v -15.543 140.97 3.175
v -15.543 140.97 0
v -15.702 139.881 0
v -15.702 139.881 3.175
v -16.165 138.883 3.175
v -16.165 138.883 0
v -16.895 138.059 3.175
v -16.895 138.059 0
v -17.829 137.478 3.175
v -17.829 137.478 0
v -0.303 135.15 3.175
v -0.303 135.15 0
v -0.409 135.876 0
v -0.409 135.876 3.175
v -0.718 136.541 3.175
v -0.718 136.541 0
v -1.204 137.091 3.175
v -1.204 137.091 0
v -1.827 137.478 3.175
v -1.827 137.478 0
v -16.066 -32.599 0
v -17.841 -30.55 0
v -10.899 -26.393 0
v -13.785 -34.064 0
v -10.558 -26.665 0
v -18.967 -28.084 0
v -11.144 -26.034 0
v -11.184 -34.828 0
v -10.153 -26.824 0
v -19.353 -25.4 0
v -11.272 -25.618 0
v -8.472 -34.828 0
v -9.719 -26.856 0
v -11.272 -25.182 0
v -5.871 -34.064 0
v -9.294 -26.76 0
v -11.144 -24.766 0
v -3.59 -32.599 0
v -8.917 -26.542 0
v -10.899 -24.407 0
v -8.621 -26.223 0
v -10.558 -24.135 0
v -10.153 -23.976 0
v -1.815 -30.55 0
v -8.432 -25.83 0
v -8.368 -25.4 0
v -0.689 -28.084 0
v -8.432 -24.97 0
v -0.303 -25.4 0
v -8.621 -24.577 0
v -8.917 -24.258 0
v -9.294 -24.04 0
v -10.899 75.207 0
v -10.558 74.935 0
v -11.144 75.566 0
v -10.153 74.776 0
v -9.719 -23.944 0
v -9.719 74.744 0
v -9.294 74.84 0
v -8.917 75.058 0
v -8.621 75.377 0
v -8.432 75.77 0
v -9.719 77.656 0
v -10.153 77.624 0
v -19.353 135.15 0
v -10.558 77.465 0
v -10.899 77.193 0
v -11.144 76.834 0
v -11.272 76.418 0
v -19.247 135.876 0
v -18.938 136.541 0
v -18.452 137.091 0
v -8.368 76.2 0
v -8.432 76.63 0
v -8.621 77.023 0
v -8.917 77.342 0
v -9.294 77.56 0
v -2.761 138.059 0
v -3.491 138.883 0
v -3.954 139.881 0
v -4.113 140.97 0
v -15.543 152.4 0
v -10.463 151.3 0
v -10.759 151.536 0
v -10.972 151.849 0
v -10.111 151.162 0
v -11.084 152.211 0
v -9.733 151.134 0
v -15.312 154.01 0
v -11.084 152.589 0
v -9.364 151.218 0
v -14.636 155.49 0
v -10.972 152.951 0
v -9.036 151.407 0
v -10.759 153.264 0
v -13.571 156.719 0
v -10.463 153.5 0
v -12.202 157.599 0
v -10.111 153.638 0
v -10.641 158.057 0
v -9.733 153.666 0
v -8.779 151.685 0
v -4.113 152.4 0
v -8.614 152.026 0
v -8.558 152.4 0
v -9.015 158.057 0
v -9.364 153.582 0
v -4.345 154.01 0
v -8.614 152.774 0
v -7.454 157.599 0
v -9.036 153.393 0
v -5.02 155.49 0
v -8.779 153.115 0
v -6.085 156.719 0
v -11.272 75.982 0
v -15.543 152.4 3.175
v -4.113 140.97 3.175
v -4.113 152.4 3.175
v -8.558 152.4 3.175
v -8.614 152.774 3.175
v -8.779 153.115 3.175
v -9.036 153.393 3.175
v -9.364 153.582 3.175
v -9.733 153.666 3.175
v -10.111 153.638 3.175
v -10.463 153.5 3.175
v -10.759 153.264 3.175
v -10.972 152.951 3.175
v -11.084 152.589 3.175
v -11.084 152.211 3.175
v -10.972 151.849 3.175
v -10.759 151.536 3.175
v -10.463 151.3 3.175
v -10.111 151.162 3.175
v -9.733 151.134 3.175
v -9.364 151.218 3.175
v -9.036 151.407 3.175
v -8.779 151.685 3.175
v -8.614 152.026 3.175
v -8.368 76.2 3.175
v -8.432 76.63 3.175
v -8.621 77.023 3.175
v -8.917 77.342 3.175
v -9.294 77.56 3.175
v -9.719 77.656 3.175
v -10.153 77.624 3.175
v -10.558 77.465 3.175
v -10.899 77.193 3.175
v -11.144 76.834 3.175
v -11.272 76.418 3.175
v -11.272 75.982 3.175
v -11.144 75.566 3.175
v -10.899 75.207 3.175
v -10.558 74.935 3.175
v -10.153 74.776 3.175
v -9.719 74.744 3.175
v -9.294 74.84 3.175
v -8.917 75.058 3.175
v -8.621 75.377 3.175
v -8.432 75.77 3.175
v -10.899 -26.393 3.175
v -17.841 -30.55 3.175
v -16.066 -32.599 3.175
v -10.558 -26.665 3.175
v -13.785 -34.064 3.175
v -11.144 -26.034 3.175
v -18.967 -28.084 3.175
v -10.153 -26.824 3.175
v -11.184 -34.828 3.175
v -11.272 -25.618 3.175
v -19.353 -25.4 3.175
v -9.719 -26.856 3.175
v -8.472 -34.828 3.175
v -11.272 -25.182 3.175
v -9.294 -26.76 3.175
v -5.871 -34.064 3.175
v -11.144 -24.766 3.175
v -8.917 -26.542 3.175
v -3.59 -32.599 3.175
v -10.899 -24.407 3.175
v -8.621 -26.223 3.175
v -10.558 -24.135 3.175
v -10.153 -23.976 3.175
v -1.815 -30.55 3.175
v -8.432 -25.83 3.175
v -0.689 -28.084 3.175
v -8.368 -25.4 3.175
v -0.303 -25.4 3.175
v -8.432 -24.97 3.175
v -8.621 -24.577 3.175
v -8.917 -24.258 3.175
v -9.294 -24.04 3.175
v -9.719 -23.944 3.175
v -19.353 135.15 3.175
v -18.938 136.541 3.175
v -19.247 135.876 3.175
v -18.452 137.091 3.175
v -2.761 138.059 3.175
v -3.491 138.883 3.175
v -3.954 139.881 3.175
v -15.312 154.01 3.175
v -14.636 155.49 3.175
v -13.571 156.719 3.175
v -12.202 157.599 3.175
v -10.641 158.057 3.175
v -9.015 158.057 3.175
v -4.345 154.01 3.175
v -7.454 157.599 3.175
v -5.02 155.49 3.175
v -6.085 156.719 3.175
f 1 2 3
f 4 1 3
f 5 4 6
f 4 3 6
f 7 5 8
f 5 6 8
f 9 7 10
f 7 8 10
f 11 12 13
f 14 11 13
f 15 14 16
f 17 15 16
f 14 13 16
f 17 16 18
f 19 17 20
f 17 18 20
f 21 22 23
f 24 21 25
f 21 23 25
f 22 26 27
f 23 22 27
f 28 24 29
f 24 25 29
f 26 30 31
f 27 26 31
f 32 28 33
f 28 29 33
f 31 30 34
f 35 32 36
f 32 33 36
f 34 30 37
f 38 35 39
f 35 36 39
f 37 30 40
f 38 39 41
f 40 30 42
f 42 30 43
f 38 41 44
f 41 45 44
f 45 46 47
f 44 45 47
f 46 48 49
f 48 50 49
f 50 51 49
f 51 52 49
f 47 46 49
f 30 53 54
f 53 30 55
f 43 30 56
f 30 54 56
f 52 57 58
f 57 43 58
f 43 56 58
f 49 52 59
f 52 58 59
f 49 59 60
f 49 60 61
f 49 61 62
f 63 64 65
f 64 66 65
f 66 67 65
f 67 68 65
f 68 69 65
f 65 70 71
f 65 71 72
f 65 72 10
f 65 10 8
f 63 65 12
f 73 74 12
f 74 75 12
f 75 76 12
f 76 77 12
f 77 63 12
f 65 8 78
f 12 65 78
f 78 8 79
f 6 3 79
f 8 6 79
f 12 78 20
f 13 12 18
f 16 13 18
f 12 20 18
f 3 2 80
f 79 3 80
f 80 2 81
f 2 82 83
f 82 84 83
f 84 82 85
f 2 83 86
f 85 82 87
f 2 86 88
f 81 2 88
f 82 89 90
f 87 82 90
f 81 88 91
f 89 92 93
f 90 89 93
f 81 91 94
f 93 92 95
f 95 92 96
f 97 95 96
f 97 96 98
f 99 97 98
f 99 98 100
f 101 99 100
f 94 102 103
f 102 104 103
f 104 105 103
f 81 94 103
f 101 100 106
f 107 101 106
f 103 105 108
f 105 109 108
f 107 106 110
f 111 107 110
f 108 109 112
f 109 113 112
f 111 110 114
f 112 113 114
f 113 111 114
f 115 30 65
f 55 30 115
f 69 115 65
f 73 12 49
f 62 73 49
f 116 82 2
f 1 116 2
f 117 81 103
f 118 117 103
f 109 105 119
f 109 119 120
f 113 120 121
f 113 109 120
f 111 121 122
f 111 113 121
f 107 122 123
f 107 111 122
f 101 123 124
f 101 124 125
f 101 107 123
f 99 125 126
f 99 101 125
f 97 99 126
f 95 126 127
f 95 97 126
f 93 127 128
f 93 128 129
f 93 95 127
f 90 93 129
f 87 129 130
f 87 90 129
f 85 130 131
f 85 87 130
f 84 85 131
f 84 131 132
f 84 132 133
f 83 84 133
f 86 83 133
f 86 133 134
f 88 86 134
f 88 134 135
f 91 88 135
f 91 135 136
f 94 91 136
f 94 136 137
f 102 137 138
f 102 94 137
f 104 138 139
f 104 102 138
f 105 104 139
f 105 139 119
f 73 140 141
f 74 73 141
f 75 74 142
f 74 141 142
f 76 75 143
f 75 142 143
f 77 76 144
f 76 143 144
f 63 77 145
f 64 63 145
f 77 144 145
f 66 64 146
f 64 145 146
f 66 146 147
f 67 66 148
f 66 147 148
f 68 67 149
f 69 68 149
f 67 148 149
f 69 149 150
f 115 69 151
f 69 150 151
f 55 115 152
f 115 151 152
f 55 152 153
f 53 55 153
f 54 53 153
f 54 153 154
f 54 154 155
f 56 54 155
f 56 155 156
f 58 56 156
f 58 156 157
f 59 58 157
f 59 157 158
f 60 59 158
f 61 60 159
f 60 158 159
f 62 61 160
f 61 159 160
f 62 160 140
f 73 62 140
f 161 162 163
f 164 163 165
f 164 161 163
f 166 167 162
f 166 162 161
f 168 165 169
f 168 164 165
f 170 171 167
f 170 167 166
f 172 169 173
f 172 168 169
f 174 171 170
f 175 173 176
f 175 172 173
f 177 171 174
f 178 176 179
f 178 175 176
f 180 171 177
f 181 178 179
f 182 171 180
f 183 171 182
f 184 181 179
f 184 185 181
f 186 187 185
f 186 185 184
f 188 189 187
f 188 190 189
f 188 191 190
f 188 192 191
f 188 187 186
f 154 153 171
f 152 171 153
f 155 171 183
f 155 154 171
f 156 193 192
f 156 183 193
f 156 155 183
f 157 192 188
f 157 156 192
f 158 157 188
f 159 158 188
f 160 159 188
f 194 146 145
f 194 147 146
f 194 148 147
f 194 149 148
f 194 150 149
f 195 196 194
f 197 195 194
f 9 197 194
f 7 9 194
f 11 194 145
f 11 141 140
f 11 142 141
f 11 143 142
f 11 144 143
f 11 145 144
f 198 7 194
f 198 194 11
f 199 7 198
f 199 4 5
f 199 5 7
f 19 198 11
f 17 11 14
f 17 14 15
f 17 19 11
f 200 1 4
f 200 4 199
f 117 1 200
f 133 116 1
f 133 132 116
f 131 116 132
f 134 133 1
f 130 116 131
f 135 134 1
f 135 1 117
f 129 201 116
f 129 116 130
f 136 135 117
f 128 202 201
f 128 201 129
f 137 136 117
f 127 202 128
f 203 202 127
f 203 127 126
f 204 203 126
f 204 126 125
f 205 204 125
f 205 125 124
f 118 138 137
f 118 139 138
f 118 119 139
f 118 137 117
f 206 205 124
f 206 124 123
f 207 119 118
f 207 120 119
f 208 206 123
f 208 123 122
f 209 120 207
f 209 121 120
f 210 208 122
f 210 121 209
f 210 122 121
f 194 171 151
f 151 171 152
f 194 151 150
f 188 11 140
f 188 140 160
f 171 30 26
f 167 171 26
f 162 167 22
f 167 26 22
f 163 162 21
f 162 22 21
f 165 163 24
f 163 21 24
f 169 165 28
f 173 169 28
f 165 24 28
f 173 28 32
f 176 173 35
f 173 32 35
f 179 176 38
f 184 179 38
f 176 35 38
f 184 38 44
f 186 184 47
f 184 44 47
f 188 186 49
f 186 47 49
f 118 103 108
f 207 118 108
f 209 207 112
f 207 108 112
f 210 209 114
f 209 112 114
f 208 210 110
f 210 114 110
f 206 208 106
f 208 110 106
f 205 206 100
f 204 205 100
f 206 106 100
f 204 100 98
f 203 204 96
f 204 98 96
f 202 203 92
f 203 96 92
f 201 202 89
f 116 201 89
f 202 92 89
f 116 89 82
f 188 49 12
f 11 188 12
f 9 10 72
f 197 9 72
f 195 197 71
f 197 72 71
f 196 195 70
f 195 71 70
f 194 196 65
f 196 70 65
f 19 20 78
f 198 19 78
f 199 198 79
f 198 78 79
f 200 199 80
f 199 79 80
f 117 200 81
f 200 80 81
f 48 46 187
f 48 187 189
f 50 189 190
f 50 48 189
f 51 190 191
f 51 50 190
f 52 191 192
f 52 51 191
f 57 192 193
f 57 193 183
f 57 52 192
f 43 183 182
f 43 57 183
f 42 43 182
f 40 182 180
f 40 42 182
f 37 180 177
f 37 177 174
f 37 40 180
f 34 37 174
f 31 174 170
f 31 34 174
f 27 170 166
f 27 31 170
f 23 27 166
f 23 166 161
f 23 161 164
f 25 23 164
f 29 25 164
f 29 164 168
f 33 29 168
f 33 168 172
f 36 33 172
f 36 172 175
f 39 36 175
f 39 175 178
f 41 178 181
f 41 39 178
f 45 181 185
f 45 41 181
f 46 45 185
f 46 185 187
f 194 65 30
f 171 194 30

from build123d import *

# Parameters (mm, degrees)
SKETCH1_R           = 1.4605
SKETCH1_R_2         = 1.27
BOSS_EXTRUDE1_DEPTH = 3.175
SKETCH3_R           = 1.4605
CUT_EXTRUDE2_DEPTH  = 3.175


with BuildPart() as part:
    # Sketch1 → Boss-Extrude1 (new body)
    with BuildSketch(Plane.XY):
        with BuildLine():
            Line((-19.353012887, 135.150128867), (-19.353012887, -25.400000121))
            ThreePointArc((-19.353012887, -25.400000121), (-9.828012887, -34.925000121), (-0.303012887, -25.400000121))
            Line((-0.303012887, -25.400000121), (-0.303012887, 135.150128867))
            ThreePointArc((-0.303012887, 135.150128867), (-0.71789642, 136.541344163), (-1.827012887, 137.47807732))
            ThreePointArc((-1.827012887, 137.47807732), (-3.490687589, 138.883177056), (-4.113012887, 140.97))
            Line((-4.113012887, 140.97), (-4.113012887, 152.4))
            ThreePointArc((-4.113012887, 152.4), (-9.828012887, 158.115), (-15.543012887, 152.4))
            Line((-15.543012887, 152.4), (-15.543012887, 140.97))
            ThreePointArc((-15.543012887, 140.97), (-16.165338186, 138.883177056), (-17.829012887, 137.47807732))
            ThreePointArc((-17.829012887, 137.47807732), (-18.938129355, 136.541344163), (-19.353012887, 135.150128867))
        make_face()
        with Locations((-9.828012887, -25.400000121)):
            Circle(SKETCH1_R, mode=Mode.SUBTRACT)
        with Locations((-9.828012887, 152.4)):
            Circle(SKETCH1_R_2, mode=Mode.SUBTRACT)
    extrude(amount=BOSS_EXTRUDE1_DEPTH)

    # Sketch3 → Cut-Extrude2 (cut)
    with BuildSketch(Plane.XY.offset(3.175)):
        with Locations((-9.828012887, 76.2)):
            Circle(SKETCH3_R)
    extrude(amount=-CUT_EXTRUDE2_DEPTH, mode=Mode.SUBTRACT)


solid = part.part
